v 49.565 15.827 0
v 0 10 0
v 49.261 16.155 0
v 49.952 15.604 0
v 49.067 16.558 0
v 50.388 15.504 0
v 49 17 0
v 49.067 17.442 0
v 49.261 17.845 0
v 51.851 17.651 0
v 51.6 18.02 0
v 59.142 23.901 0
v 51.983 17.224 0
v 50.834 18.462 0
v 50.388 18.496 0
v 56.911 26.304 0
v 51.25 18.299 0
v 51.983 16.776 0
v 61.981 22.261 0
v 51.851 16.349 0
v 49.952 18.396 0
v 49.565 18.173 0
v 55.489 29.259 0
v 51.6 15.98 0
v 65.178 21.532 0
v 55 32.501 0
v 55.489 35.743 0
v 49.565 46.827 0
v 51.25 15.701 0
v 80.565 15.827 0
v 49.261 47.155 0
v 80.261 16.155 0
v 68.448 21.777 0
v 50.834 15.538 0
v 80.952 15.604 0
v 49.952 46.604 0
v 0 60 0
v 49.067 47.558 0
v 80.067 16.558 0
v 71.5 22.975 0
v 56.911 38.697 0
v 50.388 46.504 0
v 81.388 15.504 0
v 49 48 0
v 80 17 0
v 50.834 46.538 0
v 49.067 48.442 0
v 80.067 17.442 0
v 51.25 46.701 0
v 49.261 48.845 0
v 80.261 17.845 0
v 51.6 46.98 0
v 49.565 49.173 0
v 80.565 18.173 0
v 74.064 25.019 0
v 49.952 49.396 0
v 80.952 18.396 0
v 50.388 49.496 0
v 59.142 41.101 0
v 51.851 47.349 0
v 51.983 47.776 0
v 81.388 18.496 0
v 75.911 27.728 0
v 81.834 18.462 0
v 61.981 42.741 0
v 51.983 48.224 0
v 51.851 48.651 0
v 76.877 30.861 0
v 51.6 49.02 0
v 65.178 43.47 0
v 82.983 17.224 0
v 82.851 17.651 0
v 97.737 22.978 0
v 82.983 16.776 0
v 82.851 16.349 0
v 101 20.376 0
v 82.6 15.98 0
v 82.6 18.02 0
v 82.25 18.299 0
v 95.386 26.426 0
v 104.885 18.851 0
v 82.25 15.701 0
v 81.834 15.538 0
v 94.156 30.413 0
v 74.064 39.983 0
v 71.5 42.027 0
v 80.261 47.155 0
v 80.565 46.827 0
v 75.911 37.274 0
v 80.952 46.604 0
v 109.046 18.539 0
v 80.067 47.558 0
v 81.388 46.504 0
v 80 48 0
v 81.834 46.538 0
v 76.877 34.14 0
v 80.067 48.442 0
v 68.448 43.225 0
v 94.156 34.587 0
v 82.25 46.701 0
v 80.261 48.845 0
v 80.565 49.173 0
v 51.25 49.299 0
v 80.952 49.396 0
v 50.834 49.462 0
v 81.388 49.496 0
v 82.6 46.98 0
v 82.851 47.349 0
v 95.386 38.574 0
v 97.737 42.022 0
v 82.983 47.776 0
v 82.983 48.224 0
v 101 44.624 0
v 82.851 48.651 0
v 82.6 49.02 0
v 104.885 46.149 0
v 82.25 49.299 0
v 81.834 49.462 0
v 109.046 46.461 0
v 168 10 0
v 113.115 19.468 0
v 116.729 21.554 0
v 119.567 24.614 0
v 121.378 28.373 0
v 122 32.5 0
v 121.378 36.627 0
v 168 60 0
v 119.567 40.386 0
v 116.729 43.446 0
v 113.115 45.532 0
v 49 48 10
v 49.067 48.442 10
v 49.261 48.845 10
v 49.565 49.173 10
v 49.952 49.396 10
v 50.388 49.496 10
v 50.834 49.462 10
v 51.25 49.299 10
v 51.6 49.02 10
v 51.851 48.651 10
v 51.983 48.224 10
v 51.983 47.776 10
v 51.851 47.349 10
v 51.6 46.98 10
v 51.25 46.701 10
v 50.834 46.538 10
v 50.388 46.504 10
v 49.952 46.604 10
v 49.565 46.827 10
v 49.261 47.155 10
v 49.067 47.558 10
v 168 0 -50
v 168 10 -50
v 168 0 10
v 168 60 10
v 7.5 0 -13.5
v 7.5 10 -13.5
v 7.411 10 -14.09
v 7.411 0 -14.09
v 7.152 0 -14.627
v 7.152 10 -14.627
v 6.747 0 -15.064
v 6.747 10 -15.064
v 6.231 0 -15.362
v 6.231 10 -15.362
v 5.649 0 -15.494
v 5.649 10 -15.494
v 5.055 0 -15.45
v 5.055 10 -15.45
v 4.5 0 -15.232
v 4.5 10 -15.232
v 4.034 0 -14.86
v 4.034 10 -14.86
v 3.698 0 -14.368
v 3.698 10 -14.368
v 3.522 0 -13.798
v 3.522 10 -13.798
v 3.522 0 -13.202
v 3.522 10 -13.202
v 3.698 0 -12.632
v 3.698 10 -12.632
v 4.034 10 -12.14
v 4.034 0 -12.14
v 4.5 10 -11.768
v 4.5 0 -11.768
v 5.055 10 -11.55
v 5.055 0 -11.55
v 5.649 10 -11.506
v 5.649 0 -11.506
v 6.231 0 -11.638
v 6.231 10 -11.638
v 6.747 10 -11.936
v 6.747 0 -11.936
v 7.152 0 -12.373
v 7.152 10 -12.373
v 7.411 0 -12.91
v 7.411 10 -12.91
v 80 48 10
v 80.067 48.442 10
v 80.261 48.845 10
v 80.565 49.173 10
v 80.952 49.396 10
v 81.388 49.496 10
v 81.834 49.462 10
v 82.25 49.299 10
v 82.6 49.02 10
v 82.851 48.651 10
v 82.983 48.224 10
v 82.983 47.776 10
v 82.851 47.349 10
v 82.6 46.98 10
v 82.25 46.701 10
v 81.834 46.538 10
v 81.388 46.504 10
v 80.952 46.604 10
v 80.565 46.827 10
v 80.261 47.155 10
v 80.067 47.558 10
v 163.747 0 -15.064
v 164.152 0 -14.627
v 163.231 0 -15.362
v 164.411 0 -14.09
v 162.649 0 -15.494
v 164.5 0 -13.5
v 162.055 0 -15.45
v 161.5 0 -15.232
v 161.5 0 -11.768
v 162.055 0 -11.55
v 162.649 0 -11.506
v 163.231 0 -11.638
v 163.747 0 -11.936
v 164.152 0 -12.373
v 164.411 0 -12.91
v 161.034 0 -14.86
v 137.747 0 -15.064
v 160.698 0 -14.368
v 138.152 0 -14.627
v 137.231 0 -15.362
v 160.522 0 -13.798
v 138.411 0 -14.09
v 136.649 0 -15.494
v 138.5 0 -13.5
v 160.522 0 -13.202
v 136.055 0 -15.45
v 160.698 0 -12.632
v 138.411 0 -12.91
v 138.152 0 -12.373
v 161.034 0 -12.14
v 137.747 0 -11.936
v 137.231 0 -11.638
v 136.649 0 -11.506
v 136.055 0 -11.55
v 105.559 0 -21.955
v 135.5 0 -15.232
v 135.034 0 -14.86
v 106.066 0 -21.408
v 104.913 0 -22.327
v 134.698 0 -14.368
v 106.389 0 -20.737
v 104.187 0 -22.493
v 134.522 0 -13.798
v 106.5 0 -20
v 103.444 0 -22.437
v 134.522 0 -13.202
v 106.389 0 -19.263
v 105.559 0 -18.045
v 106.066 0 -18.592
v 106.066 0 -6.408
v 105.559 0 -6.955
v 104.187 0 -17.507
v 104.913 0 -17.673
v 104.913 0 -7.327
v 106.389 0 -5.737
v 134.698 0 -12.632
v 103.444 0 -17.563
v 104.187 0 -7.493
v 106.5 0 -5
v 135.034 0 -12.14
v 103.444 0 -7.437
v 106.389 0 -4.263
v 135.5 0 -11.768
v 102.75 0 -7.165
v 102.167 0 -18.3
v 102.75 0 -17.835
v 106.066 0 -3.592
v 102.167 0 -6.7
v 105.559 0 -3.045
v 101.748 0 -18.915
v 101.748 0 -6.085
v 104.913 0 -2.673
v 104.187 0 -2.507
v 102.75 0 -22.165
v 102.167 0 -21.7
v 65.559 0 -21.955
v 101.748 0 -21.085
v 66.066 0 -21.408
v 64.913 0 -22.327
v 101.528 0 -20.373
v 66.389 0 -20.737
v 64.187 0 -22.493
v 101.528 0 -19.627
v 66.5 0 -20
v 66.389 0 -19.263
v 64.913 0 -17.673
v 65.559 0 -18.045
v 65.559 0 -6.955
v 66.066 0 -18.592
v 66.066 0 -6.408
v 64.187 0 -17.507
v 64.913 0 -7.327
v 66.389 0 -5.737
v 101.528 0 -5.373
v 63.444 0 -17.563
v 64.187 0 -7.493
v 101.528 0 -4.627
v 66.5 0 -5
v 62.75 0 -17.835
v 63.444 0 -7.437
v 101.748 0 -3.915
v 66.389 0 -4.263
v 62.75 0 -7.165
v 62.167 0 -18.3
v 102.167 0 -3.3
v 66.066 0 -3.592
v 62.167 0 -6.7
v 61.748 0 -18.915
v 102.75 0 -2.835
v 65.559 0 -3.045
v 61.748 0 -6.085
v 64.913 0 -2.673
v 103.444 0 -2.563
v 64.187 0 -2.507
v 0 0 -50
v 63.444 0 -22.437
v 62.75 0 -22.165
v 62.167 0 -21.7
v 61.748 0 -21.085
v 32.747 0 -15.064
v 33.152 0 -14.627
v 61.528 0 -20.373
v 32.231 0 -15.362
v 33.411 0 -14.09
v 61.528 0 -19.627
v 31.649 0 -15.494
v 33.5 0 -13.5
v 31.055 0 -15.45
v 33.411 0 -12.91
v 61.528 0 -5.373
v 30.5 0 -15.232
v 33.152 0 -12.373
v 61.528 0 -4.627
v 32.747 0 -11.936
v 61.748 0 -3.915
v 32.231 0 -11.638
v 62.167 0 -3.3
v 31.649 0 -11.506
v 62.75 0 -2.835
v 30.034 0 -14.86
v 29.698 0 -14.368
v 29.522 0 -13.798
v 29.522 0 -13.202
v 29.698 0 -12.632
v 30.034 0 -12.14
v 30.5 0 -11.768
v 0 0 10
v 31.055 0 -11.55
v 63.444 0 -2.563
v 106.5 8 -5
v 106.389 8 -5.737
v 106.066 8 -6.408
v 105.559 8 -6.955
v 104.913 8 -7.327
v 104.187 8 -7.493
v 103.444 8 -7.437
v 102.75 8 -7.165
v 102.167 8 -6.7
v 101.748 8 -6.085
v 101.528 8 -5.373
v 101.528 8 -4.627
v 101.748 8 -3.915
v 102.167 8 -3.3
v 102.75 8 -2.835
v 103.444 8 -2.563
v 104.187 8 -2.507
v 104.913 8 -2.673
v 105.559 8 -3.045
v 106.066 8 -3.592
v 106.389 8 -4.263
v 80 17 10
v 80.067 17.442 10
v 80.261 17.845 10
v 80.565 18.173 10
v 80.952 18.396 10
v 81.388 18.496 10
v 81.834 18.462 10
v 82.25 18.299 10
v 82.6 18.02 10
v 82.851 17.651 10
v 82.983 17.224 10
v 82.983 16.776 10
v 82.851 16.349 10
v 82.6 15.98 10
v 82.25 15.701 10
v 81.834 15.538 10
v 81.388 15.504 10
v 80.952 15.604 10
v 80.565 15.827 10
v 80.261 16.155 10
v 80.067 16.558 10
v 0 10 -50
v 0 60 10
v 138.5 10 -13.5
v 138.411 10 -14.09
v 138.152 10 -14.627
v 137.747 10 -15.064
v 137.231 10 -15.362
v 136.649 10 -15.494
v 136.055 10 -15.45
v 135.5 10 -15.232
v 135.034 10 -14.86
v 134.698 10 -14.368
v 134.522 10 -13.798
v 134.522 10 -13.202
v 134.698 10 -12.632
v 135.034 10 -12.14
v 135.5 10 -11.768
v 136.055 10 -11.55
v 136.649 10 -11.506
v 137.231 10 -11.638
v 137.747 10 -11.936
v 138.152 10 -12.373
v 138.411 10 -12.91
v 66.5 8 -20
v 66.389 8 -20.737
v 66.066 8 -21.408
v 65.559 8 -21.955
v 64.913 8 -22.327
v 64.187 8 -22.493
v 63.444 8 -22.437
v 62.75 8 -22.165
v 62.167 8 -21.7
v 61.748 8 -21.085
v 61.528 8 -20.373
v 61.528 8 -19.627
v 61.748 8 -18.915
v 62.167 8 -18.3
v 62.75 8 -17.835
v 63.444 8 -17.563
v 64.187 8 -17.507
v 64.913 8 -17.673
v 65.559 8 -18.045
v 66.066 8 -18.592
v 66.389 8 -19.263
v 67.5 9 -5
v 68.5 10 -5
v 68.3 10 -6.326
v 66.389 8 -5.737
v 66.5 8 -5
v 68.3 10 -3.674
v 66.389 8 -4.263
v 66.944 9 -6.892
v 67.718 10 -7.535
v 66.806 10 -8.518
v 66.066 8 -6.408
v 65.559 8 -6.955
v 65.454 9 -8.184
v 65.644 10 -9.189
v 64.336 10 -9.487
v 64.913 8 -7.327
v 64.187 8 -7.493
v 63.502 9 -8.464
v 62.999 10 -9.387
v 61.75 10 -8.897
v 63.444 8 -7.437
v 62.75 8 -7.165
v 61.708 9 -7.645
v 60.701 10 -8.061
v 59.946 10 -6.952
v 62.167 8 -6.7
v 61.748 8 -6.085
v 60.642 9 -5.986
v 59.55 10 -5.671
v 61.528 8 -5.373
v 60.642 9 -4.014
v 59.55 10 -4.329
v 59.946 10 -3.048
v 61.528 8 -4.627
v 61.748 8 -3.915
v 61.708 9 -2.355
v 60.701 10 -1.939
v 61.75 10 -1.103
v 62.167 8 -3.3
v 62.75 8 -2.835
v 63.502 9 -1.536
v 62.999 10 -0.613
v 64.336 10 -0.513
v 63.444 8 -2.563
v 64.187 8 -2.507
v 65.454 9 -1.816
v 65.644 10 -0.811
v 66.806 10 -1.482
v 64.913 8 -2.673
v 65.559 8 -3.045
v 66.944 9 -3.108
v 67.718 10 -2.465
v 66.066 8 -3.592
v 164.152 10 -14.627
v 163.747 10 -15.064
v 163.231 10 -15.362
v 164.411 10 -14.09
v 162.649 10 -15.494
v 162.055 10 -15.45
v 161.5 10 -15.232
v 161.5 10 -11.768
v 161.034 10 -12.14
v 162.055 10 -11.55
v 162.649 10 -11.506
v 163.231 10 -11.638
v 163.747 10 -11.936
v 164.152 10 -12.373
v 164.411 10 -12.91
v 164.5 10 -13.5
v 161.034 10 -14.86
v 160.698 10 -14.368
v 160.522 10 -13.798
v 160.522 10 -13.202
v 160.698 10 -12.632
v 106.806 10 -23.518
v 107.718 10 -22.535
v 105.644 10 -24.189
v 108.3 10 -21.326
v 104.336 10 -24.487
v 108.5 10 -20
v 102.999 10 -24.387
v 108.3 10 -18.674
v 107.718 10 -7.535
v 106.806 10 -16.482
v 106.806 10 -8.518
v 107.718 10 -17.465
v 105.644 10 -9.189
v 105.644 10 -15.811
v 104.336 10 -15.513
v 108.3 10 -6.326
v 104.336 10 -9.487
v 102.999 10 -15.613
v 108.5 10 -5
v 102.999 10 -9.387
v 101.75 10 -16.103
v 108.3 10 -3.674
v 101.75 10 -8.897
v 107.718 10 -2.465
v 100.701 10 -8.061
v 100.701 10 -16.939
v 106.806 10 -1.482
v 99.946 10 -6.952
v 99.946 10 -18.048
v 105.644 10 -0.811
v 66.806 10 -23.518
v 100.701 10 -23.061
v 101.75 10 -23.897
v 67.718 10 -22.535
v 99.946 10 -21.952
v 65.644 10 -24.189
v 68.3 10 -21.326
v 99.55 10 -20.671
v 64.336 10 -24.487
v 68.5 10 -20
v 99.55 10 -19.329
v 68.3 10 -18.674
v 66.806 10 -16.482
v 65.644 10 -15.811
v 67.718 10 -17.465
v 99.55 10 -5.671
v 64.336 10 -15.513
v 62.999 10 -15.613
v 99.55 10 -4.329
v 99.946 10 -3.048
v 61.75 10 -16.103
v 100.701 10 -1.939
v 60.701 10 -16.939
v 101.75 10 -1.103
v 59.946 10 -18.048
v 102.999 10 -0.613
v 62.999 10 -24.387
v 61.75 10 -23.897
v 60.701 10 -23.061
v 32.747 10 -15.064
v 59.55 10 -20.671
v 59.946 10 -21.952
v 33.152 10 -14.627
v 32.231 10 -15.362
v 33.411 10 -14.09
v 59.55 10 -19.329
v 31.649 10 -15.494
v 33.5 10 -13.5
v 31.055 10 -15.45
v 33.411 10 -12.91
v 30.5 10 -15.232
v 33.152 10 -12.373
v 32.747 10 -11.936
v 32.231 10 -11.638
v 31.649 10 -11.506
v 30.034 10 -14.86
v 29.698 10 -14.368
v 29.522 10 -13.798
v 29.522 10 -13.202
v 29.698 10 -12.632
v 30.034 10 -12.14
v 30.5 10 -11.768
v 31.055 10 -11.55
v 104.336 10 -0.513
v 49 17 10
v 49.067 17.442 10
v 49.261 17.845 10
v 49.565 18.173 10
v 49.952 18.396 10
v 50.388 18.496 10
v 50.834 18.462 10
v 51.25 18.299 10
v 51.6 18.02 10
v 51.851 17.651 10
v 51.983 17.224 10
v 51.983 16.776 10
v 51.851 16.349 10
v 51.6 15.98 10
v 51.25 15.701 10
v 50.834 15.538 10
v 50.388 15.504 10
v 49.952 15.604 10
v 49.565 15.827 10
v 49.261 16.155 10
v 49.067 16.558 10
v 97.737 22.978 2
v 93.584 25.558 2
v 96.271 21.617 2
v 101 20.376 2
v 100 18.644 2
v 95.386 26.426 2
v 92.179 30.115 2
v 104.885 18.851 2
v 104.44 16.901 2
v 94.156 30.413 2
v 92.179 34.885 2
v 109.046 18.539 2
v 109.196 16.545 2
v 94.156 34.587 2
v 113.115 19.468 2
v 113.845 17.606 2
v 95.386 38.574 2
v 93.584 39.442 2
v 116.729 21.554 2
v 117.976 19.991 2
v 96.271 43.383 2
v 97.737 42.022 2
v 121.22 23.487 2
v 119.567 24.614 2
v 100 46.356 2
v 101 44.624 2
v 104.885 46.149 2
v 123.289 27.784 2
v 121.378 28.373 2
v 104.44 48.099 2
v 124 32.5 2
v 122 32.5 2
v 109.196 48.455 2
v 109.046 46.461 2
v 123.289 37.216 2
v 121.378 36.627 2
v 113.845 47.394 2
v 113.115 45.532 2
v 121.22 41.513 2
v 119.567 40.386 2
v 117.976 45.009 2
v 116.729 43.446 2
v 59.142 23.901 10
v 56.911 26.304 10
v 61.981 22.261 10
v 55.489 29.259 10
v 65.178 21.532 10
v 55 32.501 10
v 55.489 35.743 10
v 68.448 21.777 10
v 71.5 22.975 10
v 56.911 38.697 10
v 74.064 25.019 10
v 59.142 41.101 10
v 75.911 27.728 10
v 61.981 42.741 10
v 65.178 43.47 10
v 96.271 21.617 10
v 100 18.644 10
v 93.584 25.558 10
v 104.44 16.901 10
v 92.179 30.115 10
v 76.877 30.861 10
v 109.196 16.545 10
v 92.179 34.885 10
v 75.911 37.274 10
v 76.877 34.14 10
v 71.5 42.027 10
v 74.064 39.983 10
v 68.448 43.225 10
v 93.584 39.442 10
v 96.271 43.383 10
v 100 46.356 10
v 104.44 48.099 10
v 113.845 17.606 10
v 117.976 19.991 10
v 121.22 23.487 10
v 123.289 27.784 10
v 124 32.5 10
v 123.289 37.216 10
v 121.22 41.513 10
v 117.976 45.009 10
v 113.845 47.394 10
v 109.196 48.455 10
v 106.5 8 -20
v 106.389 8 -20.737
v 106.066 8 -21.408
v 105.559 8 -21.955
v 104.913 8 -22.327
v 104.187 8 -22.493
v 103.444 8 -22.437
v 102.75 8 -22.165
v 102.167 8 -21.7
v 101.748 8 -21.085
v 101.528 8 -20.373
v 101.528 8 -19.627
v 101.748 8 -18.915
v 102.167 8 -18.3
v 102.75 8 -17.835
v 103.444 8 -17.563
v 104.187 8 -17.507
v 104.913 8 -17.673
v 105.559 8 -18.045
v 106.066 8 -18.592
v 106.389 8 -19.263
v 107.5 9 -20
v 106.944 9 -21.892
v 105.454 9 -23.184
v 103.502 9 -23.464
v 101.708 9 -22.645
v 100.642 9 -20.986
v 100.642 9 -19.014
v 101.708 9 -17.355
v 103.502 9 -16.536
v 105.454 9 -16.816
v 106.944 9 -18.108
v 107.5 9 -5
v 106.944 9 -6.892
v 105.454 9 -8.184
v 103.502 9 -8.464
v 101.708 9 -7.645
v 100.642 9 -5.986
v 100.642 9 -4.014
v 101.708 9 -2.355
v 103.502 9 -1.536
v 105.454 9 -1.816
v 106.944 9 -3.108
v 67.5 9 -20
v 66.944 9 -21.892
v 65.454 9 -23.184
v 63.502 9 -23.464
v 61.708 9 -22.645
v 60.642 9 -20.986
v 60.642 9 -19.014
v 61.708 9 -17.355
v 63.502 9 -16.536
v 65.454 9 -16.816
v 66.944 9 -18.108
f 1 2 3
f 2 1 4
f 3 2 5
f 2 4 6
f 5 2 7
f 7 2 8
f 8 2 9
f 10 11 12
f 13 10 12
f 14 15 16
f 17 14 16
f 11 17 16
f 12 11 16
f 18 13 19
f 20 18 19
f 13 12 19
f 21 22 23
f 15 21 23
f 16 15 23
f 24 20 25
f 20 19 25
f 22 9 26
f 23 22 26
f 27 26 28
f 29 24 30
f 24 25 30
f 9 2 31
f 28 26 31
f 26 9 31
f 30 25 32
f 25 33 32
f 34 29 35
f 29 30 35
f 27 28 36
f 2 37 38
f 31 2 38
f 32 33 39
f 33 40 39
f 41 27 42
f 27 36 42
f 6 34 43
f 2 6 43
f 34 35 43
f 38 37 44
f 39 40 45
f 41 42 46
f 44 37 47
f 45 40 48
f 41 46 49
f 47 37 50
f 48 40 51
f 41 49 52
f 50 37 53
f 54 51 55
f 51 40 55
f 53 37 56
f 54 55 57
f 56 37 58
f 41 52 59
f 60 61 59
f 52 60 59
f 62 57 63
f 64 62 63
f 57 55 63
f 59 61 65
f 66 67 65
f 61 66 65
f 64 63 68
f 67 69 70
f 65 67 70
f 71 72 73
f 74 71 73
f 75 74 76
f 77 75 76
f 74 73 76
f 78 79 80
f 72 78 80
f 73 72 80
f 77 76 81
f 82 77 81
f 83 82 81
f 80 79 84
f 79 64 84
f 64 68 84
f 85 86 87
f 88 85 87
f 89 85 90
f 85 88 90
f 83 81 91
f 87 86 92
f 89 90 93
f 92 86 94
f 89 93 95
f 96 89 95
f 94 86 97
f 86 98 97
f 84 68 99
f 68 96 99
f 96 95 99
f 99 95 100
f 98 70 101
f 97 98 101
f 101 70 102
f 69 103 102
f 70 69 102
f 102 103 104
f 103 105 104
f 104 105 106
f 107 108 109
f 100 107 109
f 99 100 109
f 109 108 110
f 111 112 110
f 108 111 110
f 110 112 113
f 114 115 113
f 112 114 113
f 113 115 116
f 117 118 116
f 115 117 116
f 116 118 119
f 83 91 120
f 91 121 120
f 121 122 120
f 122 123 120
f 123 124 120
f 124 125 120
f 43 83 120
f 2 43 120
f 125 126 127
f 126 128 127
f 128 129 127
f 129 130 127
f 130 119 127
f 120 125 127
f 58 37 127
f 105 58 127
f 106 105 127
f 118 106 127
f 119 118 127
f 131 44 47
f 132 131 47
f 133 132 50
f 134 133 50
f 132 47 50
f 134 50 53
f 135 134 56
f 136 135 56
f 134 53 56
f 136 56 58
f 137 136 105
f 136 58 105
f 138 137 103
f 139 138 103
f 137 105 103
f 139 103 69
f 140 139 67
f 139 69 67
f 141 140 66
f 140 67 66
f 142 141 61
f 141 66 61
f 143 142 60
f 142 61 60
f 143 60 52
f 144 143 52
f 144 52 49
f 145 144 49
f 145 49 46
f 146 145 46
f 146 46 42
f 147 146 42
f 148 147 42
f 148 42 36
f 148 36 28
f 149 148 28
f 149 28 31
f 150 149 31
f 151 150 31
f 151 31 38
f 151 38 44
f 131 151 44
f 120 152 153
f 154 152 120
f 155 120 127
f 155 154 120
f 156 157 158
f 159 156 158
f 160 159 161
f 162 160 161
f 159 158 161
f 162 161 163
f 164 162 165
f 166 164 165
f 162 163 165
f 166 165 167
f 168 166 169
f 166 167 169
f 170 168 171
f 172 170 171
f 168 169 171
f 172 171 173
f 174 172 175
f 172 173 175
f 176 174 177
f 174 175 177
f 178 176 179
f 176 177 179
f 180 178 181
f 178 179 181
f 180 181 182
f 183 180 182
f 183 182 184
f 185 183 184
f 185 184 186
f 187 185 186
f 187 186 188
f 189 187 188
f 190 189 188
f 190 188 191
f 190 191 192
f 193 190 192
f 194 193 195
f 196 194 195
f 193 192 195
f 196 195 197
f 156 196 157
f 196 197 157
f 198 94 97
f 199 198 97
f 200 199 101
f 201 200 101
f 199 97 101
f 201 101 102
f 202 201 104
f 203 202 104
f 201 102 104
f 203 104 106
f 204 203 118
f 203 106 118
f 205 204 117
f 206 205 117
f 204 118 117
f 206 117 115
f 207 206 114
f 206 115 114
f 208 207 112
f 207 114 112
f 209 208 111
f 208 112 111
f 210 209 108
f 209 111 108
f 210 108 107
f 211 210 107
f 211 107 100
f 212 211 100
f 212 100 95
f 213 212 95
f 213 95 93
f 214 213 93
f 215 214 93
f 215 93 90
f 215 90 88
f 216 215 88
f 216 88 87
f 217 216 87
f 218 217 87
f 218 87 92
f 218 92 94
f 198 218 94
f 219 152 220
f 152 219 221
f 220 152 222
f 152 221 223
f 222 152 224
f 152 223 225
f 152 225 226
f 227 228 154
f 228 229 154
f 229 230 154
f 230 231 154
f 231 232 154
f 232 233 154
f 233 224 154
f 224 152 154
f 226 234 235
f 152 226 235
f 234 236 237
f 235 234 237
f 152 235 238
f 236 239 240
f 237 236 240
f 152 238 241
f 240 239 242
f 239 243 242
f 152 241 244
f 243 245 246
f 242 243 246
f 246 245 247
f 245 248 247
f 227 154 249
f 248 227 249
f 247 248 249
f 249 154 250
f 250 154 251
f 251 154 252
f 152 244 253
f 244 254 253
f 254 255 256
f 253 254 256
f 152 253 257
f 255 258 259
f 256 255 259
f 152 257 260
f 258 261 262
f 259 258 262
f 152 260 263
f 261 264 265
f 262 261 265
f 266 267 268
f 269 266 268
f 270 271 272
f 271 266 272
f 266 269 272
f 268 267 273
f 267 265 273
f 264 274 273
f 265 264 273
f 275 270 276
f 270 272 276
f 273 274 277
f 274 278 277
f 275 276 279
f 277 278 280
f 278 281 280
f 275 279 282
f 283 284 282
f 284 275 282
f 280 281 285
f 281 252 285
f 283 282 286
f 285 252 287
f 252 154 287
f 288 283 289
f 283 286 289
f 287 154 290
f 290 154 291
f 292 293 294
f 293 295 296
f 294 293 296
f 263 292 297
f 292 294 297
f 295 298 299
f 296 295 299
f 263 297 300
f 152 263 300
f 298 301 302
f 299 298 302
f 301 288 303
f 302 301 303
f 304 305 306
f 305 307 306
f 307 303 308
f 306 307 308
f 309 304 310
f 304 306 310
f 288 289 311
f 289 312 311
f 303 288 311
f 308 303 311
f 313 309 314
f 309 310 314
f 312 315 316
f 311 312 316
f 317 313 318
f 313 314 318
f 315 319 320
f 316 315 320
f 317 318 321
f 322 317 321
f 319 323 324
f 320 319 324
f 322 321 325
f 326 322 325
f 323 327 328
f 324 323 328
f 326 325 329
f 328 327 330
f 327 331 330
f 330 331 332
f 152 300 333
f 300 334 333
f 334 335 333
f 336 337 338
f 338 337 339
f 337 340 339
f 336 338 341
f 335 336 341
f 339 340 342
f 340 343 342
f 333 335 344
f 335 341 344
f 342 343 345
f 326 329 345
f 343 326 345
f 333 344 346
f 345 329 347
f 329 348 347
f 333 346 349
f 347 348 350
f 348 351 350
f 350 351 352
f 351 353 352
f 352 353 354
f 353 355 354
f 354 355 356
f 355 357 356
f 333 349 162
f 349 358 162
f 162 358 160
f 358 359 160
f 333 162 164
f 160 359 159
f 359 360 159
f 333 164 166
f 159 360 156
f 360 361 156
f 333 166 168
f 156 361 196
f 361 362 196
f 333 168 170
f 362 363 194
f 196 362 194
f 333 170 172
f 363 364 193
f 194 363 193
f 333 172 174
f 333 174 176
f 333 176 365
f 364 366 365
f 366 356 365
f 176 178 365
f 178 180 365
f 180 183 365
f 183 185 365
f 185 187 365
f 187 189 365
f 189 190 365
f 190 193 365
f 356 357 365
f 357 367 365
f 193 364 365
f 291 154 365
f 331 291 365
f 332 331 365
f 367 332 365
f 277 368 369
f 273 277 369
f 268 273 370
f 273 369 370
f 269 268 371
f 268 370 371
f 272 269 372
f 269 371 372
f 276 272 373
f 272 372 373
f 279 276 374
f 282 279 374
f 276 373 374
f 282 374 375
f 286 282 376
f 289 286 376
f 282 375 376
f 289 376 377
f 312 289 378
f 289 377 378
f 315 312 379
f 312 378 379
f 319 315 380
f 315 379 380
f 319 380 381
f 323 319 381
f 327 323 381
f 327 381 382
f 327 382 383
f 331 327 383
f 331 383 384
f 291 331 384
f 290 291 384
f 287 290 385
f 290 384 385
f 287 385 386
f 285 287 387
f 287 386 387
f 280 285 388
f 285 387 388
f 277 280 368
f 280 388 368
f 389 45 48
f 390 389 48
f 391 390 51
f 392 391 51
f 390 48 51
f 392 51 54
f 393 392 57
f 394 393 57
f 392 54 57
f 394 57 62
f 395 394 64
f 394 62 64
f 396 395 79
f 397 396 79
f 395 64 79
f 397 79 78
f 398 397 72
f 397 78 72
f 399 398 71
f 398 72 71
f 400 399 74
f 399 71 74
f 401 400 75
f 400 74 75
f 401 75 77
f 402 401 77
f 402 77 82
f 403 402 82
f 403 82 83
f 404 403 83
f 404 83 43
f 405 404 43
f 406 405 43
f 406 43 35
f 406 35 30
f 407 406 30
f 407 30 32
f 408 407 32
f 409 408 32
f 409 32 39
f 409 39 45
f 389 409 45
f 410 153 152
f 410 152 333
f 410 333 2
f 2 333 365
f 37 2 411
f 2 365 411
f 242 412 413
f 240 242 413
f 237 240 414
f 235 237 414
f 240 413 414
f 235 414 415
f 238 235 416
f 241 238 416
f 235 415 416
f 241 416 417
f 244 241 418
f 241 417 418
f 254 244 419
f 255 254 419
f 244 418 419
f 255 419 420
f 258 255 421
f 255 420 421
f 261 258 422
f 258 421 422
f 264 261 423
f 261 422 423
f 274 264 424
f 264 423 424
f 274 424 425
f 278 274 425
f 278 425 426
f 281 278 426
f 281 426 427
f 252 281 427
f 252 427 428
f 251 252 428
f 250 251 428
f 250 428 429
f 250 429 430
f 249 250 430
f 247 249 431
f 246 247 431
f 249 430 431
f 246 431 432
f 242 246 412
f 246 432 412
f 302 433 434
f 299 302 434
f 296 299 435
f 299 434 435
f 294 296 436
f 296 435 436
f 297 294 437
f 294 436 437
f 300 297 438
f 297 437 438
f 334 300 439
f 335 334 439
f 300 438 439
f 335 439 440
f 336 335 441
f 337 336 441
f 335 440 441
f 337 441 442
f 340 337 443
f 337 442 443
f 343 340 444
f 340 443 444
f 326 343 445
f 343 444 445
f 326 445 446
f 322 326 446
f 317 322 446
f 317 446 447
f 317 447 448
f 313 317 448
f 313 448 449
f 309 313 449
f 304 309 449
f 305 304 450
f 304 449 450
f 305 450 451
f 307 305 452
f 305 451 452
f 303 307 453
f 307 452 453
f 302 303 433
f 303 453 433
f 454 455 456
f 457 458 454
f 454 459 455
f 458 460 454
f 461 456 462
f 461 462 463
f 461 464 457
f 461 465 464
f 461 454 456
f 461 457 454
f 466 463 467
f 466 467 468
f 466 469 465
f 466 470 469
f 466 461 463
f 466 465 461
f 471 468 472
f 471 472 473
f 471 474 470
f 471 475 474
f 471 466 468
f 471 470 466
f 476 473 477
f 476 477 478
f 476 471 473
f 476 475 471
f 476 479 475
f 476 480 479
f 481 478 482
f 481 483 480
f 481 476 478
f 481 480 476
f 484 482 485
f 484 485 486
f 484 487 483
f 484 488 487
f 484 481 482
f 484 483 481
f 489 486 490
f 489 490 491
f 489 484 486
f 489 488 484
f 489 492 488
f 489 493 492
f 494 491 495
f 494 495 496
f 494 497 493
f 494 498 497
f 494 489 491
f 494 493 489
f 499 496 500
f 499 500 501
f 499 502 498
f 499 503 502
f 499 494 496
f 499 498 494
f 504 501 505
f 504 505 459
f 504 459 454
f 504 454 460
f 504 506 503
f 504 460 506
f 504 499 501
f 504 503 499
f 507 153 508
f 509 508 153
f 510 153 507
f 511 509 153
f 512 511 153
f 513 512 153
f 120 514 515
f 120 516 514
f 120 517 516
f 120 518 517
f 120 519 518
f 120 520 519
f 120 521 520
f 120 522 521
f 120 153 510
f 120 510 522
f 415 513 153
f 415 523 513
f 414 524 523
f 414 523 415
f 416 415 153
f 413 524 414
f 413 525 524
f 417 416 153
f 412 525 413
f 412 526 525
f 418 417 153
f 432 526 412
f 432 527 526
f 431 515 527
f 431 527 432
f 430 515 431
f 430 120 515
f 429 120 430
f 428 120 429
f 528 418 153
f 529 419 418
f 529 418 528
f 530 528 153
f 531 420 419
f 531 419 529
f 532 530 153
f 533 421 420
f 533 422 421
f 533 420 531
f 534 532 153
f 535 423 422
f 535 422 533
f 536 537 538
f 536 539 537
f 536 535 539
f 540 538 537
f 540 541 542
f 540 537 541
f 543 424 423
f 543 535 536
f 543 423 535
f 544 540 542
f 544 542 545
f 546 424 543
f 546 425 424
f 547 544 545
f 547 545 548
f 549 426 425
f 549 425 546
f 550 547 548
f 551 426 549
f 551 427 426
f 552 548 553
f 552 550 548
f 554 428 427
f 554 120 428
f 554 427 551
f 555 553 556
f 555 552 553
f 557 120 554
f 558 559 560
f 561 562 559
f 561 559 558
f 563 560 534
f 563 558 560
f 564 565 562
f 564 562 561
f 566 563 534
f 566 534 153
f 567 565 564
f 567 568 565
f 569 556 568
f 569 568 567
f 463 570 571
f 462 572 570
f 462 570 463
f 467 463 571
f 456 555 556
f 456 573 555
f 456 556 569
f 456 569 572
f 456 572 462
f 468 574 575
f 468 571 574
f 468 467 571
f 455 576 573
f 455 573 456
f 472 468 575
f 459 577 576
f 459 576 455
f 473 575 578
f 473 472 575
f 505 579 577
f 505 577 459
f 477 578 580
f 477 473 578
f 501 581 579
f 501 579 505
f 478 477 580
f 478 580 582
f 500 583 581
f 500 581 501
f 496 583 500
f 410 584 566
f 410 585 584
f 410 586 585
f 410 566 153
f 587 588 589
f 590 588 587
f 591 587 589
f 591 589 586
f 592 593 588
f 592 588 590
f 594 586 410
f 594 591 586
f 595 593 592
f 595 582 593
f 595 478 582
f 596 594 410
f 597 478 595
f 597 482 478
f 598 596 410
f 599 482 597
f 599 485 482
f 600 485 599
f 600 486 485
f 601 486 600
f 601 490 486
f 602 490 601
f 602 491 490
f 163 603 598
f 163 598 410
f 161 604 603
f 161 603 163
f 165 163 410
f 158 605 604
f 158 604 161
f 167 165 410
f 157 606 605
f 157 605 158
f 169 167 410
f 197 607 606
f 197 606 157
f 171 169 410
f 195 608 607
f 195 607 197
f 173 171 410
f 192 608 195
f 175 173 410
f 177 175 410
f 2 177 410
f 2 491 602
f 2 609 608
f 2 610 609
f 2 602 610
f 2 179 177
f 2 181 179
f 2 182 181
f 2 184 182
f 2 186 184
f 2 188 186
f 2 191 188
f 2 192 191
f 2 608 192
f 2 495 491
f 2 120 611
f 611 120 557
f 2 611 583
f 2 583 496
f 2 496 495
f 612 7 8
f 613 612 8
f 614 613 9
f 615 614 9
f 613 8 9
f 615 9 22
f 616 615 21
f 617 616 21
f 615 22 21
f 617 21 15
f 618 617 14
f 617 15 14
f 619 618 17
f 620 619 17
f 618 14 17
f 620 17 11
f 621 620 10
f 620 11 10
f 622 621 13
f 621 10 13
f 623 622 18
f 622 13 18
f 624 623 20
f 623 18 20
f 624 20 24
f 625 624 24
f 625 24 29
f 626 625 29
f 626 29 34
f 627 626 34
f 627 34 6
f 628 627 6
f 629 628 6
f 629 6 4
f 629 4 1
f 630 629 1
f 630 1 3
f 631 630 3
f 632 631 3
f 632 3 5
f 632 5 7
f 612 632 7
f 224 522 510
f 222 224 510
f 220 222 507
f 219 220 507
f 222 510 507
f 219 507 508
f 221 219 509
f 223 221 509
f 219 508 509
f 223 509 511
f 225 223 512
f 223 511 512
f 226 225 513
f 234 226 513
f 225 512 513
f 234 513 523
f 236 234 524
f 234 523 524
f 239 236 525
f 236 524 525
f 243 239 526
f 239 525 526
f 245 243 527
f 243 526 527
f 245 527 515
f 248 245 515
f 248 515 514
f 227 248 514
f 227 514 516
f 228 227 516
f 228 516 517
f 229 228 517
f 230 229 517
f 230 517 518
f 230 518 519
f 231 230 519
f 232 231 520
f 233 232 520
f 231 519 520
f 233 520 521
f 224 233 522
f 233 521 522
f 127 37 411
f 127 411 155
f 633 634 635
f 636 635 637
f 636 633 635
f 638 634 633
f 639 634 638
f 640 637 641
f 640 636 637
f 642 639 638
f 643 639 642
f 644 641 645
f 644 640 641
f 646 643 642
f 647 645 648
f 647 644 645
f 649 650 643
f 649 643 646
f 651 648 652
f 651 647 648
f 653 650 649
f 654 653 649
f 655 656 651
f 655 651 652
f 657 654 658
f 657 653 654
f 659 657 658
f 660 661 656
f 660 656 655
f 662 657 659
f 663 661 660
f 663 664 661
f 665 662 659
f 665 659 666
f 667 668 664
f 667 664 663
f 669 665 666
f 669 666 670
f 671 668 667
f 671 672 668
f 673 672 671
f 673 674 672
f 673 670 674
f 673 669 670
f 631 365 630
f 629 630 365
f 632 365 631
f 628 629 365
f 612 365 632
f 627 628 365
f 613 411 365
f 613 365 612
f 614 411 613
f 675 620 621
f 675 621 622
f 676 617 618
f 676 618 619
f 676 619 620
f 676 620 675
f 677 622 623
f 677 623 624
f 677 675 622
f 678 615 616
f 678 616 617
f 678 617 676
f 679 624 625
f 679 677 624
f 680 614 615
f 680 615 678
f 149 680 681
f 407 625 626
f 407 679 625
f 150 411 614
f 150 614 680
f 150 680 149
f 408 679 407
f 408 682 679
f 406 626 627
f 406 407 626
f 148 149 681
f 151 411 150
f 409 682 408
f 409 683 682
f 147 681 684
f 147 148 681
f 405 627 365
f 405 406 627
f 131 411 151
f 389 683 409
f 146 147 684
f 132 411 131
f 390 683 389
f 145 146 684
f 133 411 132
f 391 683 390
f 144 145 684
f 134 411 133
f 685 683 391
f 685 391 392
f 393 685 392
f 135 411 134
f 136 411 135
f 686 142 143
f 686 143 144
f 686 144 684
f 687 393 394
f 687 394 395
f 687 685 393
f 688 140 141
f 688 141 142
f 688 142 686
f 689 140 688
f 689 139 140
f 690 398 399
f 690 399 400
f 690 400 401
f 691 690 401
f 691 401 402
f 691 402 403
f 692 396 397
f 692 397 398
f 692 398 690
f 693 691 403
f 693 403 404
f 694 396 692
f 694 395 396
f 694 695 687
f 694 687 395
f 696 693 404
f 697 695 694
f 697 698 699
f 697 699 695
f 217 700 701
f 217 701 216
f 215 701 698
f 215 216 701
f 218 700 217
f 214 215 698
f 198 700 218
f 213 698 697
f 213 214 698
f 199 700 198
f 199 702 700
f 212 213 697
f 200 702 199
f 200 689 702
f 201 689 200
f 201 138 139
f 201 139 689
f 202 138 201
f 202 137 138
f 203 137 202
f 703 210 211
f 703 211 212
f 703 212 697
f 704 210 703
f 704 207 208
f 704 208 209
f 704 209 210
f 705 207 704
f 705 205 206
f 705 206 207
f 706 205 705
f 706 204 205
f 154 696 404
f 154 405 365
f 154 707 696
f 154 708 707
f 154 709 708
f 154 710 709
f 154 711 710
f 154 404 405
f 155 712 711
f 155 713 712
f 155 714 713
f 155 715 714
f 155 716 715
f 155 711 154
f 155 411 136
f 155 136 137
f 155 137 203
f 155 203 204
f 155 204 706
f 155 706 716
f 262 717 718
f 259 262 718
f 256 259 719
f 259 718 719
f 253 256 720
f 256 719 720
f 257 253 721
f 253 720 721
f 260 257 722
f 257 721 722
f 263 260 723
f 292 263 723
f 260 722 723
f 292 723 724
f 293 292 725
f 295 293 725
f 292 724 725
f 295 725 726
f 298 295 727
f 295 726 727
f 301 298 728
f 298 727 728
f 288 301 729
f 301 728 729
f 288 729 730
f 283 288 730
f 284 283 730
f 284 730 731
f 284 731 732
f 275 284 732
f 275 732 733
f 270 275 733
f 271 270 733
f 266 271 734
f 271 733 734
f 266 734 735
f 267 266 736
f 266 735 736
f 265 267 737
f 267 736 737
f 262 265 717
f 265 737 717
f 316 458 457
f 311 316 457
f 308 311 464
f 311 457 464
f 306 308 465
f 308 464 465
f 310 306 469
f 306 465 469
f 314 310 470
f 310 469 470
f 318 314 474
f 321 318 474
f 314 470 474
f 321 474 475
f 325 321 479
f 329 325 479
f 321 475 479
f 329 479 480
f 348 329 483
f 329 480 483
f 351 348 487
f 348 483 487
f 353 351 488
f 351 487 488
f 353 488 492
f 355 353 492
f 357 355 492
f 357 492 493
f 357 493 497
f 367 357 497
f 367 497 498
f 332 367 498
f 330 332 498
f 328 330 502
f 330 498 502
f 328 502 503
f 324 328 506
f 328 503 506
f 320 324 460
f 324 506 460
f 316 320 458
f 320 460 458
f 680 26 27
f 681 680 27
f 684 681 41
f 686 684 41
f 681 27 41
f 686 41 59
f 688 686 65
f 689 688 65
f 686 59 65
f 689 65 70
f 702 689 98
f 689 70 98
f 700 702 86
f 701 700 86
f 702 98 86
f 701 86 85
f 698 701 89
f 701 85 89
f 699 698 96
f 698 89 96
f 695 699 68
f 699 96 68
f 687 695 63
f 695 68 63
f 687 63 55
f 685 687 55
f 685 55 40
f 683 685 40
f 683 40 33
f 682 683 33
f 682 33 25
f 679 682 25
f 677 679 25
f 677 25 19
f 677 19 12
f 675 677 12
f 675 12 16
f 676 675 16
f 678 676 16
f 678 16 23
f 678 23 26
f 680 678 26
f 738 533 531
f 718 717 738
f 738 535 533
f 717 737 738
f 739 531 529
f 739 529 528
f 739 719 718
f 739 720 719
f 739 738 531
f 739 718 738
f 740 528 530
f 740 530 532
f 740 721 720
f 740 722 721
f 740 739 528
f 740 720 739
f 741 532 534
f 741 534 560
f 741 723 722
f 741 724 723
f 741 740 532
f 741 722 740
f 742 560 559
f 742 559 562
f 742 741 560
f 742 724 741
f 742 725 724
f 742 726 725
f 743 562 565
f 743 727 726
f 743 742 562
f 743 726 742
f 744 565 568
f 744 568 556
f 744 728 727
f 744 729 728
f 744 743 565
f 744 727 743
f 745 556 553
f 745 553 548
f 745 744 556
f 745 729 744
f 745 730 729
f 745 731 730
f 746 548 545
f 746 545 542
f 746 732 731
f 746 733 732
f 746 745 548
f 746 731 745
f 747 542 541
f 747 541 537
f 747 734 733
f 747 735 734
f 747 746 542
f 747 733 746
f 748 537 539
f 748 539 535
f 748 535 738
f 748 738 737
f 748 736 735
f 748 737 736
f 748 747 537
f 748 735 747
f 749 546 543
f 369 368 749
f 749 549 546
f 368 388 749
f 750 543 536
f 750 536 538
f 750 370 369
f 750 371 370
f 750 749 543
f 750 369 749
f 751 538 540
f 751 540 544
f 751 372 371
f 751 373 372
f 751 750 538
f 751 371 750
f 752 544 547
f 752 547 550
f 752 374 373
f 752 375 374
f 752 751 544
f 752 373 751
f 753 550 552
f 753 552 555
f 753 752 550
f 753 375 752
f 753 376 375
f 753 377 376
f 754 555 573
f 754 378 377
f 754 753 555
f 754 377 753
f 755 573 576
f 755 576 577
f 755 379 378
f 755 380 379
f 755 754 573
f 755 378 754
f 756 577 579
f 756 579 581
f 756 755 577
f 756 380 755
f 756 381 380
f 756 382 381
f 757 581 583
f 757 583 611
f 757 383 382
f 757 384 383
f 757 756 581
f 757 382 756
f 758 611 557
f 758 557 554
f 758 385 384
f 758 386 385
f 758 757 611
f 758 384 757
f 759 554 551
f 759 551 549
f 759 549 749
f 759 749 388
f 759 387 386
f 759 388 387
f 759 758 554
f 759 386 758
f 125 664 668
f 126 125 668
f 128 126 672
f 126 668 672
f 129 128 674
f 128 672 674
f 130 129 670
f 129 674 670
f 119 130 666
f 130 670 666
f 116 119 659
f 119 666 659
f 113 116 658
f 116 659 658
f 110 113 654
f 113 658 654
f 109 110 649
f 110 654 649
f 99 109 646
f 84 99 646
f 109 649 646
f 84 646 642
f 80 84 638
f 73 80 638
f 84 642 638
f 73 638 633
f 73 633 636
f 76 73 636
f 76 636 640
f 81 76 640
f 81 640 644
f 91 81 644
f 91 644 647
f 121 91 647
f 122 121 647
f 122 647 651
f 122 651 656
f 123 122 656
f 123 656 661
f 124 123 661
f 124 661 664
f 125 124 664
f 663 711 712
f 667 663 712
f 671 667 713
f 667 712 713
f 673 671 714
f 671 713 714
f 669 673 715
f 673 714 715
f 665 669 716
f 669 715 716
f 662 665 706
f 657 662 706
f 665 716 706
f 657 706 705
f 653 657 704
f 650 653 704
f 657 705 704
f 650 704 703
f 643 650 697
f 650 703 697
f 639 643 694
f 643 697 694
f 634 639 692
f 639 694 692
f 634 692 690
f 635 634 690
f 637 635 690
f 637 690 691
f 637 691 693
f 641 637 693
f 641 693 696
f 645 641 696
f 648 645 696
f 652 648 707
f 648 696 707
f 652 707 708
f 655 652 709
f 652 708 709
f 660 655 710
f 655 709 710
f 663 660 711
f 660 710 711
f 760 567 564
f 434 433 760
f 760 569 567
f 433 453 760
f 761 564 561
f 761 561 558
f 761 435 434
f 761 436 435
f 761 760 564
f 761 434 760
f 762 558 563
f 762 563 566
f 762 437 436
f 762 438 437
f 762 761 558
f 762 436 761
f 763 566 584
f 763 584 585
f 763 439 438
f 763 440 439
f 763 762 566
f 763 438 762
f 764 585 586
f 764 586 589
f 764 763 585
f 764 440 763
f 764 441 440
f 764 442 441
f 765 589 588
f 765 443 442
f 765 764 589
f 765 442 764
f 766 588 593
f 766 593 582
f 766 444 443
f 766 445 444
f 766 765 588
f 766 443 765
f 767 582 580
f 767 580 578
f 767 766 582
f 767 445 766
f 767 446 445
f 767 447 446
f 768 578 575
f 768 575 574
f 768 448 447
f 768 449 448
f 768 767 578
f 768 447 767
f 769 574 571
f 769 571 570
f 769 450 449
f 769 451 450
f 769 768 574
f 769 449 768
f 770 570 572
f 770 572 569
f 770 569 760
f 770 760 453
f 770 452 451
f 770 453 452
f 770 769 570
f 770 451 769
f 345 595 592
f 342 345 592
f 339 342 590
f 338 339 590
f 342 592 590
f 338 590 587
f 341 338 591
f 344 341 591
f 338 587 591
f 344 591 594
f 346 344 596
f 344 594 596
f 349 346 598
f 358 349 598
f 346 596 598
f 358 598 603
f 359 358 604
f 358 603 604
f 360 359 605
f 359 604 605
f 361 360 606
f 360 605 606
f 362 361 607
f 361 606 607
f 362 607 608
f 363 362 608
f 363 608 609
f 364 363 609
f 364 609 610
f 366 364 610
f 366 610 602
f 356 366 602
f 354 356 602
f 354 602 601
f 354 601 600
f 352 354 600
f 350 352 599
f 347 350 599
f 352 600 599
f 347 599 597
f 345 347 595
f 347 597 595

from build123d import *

# Parameters (mm, degrees)
SKIZZE1_W                       = 168
SKIZZE1_H                       = 60
AUFSATZ_LINEAR_AUSTRAGEN1_DEPTH = 10
SKIZZE2_R                       = 14
SCHNITT_LINEAR_AUSTRAGEN1_DEPTH = 27
SKIZZE3_R                       = 16
SCHNITT_LINEAR_AUSTRAGEN2_DEPTH = 8
SKIZZE4_R                       = 11
SCHNITT_LINEAR_AUSTRAGEN3_DEPTH = 21.6
SKIZZE5_W                       = 168
SKIZZE5_H                       = 10
AUFSATZ_LINEAR_AUSTRAGEN2_DEPTH = 50
SKIZZE6_R                       = 2
SCHNITT_LINEAR_AUSTRAGEN4_DEPTH = 10
SKIZZE7_R                       = 2.5
SCHNITT_LINEAR_AUSTRAGEN5_DEPTH = 10
SKIZZE8_R                       = 1.5
SCHNITT_LINEAR_AUSTRAGEN6_DEPTH = 27
FASE1_SIZE                      = 2
FASE2_SIZE                      = 2
FASE3_SIZE                      = 2
FASE4_SIZE                      = 2


with BuildPart() as part:
    # Skizze1 → Aufsatz-Linear austragen1 (new body)
    with BuildSketch(Plane.XY):
        with Locations((84, 30)):
            Rectangle(SKIZZE1_W, SKIZZE1_H)
    extrude(amount=AUFSATZ_LINEAR_AUSTRAGEN1_DEPTH)

    # Skizze2 → Schnitt-Linear austragen1 (cut)
    with BuildSketch(Plane.XY.offset(10)):
        with Locations((108, 32.5)):
            Circle(SKIZZE2_R)
    extrude(amount=-SCHNITT_LINEAR_AUSTRAGEN1_DEPTH, mode=Mode.SUBTRACT)

    # Skizze3 → Schnitt-Linear austragen2 (cut)
    with BuildSketch(Plane.XY.offset(10)):
        with Locations((108, 32.5)):
            Circle(SKIZZE3_R)
    extrude(amount=-SCHNITT_LINEAR_AUSTRAGEN2_DEPTH, mode=Mode.SUBTRACT)

    # Skizze4 → Schnitt-Linear austragen3 (cut)
    with BuildSketch(Plane(origin=(0, 0, 0), x_dir=(-1, 0, 0), z_dir=(0, 0, -1))):
        with Locations((-66, 32.50089026)):
            Circle(SKIZZE4_R)
    extrude(amount=-SCHNITT_LINEAR_AUSTRAGEN3_DEPTH, mode=Mode.SUBTRACT)

    # Skizze5 → Aufsatz-Linear austragen2 (add)
    with BuildSketch(Plane(origin=(0, 0, 0), x_dir=(-1, 0, 0), z_dir=(0, 0, -1))):
        with Locations((-84, 5)):
            Rectangle(SKIZZE5_W, SKIZZE5_H)
    extrude(amount=AUFSATZ_LINEAR_AUSTRAGEN2_DEPTH)

    # Skizze6 → Schnitt-Linear austragen4 (cut)
    with BuildSketch(Plane(origin=(0, 10, 0), x_dir=(1, 0, 0), z_dir=(0, 1, 0))):
        with Locations((5.5, 13.5)):
            Circle(SKIZZE6_R)
        with Locations((31.5, 13.5)):
            Circle(SKIZZE6_R)
        with Locations((162.5, 13.5)):
            Circle(SKIZZE6_R)
        with Locations((136.5, 13.5)):
            Circle(SKIZZE6_R)
    extrude(amount=-SCHNITT_LINEAR_AUSTRAGEN4_DEPTH, mode=Mode.SUBTRACT)

    # Skizze7 → Schnitt-Linear austragen5 (cut)
    with BuildSketch(Plane(origin=(0, 10, 0), x_dir=(1, 0, 0), z_dir=(0, 1, 0))):
        with Locations((104, 20)):
            Circle(SKIZZE7_R)
        with Locations((64, 20)):
            Circle(SKIZZE7_R)
        with Locations((64, 5)):
            Circle(SKIZZE7_R)
        with Locations((104, 5)):
            Circle(SKIZZE7_R)
    extrude(amount=-SCHNITT_LINEAR_AUSTRAGEN5_DEPTH, mode=Mode.SUBTRACT)

    # Skizze8 → Schnitt-Linear austragen6 (cut)
    with BuildSketch(Plane(origin=(0, 0, 0), x_dir=(-1, 0, 0), z_dir=(0, 0, -1))):
        with Locations((-50.5, 48)):
            Circle(SKIZZE8_R)
        with Locations((-50.5, 17)):
            Circle(SKIZZE8_R)
        with Locations((-81.5, 17)):
            Circle(SKIZZE8_R)
        with Locations((-81.5, 48)):
            Circle(SKIZZE8_R)
    extrude(amount=-SCHNITT_LINEAR_AUSTRAGEN6_DEPTH, mode=Mode.SUBTRACT)

    # Fase1
    fase1_edges = [part.edges().sort_by_distance(p)[0] for p in [
        (61.5, 10, -5),
    ]]
    chamfer(fase1_edges, length=FASE1_SIZE)

    # Fase2
    fase2_edges = [part.edges().sort_by_distance(p)[0] for p in [
        (61.5, 10, -20),
    ]]
    chamfer(fase2_edges, length=FASE2_SIZE)

    # Fase3
    fase3_edges = [part.edges().sort_by_distance(p)[0] for p in [
        (101.5, 10, -20),
    ]]
    chamfer(fase3_edges, length=FASE3_SIZE)

    # Fase4
    fase4_edges = [part.edges().sort_by_distance(p)[0] for p in [
        (101.5, 10, -5),
    ]]
    chamfer(fase4_edges, length=FASE4_SIZE)


solid = part.part
